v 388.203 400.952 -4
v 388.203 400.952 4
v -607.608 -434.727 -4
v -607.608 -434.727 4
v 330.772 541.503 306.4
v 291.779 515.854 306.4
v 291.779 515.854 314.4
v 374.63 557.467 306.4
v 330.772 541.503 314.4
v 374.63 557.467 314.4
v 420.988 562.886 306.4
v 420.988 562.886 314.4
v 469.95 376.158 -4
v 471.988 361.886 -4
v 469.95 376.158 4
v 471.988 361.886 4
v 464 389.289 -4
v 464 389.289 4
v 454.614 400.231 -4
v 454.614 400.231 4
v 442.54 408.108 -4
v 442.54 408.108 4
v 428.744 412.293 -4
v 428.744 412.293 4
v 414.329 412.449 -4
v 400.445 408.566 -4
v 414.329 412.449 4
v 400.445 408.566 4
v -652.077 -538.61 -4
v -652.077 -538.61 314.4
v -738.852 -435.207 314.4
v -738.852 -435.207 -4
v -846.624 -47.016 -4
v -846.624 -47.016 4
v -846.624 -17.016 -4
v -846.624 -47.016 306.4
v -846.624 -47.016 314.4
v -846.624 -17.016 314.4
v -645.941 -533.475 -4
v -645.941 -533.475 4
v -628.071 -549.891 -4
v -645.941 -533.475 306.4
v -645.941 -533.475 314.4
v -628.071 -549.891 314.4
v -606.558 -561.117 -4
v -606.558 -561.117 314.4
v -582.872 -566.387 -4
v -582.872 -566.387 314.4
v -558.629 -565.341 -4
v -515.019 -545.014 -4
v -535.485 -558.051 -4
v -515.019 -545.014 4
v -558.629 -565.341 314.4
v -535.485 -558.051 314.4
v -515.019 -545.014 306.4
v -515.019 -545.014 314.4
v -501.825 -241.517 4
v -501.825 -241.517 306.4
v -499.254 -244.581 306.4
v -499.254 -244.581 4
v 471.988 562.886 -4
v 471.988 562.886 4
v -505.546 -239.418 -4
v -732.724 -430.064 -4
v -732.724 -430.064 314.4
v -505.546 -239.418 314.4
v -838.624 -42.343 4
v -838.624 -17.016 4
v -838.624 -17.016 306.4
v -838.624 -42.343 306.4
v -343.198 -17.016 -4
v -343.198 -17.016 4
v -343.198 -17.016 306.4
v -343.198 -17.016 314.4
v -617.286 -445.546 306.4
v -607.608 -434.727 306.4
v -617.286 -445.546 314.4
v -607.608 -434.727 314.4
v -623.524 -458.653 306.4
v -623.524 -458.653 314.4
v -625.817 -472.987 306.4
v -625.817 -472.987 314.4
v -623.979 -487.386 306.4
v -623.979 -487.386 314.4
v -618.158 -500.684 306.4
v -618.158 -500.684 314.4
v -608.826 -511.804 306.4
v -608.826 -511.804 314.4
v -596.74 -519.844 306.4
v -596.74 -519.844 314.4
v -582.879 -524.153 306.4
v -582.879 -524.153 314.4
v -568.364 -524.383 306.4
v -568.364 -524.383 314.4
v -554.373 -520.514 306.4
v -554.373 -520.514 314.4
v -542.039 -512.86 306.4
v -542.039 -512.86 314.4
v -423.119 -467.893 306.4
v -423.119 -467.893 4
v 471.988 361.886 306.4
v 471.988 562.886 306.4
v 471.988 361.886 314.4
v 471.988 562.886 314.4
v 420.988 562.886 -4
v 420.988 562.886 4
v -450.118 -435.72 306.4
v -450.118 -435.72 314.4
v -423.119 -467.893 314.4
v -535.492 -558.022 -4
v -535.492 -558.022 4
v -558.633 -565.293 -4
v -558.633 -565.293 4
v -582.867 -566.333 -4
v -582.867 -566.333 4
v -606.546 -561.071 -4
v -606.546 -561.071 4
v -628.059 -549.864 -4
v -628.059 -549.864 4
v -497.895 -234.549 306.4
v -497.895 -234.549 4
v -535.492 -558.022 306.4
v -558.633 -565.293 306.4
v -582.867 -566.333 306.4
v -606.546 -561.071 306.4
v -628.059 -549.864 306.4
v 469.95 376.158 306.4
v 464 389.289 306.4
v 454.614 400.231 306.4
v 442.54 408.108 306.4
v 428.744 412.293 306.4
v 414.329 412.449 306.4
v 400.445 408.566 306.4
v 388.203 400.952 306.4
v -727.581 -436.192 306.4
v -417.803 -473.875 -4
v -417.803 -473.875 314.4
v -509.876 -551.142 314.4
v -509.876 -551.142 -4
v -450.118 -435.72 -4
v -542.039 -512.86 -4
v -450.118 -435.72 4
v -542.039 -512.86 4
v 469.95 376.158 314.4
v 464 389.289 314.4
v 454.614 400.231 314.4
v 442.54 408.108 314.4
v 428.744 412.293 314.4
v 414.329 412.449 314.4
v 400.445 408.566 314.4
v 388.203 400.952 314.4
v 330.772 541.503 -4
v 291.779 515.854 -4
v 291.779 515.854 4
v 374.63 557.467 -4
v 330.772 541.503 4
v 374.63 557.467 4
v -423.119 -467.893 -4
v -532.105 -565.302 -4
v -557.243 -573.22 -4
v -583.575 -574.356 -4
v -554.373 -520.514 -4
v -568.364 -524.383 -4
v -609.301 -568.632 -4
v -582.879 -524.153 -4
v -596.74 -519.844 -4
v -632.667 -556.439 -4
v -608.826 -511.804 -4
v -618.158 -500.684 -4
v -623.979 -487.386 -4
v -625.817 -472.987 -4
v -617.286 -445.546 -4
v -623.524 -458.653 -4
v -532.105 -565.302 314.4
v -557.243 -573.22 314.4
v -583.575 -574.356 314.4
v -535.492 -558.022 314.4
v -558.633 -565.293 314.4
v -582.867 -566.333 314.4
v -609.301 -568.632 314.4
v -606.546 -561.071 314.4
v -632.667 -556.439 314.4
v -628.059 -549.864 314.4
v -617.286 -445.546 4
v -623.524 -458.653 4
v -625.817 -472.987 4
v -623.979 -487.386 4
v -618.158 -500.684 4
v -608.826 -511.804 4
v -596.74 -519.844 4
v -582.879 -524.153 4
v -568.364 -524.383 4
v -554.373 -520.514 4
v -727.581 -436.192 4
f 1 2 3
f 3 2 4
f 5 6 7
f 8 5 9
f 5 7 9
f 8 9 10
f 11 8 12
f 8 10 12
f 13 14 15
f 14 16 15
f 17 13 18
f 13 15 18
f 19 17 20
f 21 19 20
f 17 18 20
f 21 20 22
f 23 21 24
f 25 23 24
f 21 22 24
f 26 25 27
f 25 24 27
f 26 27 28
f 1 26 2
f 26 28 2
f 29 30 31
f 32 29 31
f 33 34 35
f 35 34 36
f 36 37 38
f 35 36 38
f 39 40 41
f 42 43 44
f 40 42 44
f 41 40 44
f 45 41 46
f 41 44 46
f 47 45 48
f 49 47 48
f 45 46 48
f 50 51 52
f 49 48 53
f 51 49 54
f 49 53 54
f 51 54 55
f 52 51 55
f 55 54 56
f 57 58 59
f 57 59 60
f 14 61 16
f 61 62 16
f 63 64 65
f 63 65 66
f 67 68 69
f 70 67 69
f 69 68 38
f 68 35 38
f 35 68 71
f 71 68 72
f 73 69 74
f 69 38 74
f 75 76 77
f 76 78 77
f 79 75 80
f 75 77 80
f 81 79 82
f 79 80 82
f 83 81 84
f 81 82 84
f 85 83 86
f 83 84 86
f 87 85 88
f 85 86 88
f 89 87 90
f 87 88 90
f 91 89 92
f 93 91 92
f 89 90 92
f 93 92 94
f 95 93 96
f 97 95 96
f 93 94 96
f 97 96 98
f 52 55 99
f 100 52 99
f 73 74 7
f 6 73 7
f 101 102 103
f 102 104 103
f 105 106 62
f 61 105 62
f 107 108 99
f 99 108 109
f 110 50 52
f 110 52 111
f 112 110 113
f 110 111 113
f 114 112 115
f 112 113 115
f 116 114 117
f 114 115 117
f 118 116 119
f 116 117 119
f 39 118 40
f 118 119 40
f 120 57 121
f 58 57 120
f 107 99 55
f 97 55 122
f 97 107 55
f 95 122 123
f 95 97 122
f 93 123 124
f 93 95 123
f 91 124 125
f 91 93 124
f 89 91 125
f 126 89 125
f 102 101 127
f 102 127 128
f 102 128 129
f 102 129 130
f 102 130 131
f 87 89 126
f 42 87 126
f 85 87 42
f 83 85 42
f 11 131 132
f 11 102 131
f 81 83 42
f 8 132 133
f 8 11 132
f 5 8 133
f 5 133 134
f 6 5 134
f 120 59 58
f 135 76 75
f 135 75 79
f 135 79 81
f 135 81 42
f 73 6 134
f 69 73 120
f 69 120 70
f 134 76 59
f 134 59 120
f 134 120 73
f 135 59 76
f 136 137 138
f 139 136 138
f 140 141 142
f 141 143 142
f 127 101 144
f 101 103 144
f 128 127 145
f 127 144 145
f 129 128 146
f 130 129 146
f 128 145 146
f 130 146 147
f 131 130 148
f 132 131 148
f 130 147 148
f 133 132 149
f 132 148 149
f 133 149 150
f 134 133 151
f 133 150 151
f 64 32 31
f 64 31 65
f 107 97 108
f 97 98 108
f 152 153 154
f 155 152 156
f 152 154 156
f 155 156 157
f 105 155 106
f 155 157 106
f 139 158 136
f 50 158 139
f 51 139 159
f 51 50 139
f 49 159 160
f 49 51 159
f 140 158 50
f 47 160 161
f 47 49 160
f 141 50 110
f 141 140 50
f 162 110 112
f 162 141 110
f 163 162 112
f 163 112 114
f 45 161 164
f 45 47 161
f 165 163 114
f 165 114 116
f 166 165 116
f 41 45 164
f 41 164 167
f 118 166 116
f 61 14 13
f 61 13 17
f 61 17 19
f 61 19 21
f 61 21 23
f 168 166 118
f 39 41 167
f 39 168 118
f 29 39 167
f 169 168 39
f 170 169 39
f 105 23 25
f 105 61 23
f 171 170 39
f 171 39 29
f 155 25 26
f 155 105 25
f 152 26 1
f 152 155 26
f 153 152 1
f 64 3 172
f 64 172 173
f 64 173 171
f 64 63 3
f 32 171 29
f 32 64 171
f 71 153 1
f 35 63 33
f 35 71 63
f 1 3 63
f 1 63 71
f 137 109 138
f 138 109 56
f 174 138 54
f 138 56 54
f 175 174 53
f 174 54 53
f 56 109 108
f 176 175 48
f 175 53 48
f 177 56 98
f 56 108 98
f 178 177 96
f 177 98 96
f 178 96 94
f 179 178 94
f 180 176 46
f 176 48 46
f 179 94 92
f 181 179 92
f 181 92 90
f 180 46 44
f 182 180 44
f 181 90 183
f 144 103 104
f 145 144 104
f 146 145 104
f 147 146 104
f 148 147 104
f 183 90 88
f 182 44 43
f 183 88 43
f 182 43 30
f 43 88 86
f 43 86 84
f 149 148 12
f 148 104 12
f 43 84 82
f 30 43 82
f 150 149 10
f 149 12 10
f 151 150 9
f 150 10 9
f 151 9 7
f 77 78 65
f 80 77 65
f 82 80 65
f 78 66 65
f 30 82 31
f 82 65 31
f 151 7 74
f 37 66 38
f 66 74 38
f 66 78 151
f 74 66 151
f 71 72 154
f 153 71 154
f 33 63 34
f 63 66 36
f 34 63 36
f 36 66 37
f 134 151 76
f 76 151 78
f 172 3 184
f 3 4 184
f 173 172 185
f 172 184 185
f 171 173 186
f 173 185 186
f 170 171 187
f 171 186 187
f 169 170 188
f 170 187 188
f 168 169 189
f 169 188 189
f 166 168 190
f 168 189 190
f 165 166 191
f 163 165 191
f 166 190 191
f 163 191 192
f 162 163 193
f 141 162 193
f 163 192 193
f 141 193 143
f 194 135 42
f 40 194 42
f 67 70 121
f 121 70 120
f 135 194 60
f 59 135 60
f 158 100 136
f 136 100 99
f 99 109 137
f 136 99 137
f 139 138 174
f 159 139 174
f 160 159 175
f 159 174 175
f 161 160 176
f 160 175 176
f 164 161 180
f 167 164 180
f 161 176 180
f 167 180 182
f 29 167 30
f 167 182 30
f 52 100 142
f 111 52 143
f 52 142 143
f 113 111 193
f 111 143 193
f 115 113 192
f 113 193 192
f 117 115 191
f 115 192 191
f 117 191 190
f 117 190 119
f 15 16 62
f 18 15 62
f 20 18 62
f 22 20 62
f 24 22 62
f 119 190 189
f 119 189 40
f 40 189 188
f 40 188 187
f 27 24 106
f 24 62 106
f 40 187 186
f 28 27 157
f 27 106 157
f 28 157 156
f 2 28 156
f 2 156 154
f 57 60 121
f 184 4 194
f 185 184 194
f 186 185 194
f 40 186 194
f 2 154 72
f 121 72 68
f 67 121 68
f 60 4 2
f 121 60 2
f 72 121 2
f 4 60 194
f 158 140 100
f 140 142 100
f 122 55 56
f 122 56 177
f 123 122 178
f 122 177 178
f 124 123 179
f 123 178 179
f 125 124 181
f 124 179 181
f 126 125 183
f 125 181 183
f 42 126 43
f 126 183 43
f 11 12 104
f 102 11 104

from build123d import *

# Parameters (mm, degrees)
EXTRUDE_1_DEPTH        = 4
PATTERN_LINEAR_1_COUNT = 2
PATTERN_LINEAR_1_PITCH = 310.4
SKETCH_7_W             = 395.874868567
SKETCH_7_H             = 318.4
EXTRUDE_2_DEPTH        = 8
SKETCH_8_W             = 318.4
SKETCH_8_H             = 30
EXTRUDE_3_DEPTH        = 8
SKETCH_9_W             = 298.07386306
SKETCH_9_H             = 318.4
EXTRUDE_4_DEPTH        = 4
EXTRUDE_5_DEPTH        = 318.4


with BuildPart() as part:
    # 草图4 → 凸台-拉伸1 (new, symmetric)
    with BuildSketch(Plane.XY):
        with BuildLine():
            Line((420.987802859, 562.886051953), (471.987802859, 562.886051953))
            Line((471.987802859, 562.886051953), (471.987802859, 361.886051953))
            ThreePointArc((471.987802859, 361.886051953), (442.540044204, 408.108350608), (388.203454114, 400.952488665))
            Line((388.203454114, 400.952488665), (-607.607677768, -434.726989137))
            ThreePointArc((-607.607677768, -434.726989137), (-613.889765736, -506.577774594), (-542.038980279, -512.859862561))
            Line((-542.038980279, -512.859862561), (-450.117952721, -435.720218456))
            Line((-450.117952721, -435.720218456), (-423.119077284, -467.892578102))
            Line((-423.119077284, -467.892578102), (-515.018746035, -545.014298008))
            ThreePointArc((-515.018746035, -545.014298008), (-582.867486655, -566.333113479), (-645.94139002, -533.475447539))
            Line((-645.94139002, -533.475447539), (-730.152226268, -433.128256555))
            Line((-730.152226268, -433.128256555), (-659.034107171, -373.446304098))
            Line((-659.034107171, -373.446304098), (-501.825094761, -241.51732561))
            Line((-501.825094761, -241.51732561), (-846.623641588, -47.015722354))
            Line((-846.623641588, -47.015722354), (-846.623641588, -17.015722354))
            Line((-846.623641588, -17.015722354), (-343.198253767, -17.015722354))
            Line((-343.198253767, -17.015722354), (291.778898983, 515.853773113))
            ThreePointArc((291.778898983, 515.853773113), (352.236482701, 550.762350034), (420.987802859, 562.886051953))
        make_face()
    extrude(amount=EXTRUDE_1_DEPTH, both=True)


with BuildPart() as pattern_linear_1_1:
    # 阵列(线性)1: pattern copy
    add(part.part.moved(Location(Vector(0, 0, 1) * (1 * PATTERN_LINEAR_1_PITCH))))


with BuildPart() as part_1:
    add(part.part)

    add(pattern_linear_1_1.part)  # 凸台-拉伸2 merges 阵列(线性)1_1
    # 草图7 → 凸台-拉伸2 (add)
    with BuildSketch(Plane(origin=(-224.491205057, -397.961970406, 0), x_dir=(0.870978620276557, -0.4913209165312884, 0), z_dir=(-0.4913209165312884, -0.870978620276557, 0))):
        with Locations((-516.353849163, 155.2)):
            Rectangle(SKETCH_7_W, SKETCH_7_H)
    extrude(amount=-EXTRUDE_2_DEPTH)

    # 草图8 → 凸台-拉伸3 (add)
    with BuildSketch(Plane.ZY.offset(846.623641588)):
        with Locations((155.2, -32.015722354)):
            Rectangle(SKETCH_8_W, SKETCH_8_H)
    extrude(amount=-EXTRUDE_3_DEPTH)

    # 草图9 → 凸台-拉伸4 (add, symmetric)
    with BuildSketch(Plane(origin=(-88.443218659, 105.390576195, 0), x_dir=(0.7660085629862927, 0.6428303675400493, 0), z_dir=(-0.6428303675400493, 0.7660085629862927, 0))):
        with Locations((-688.693922428, -155.2)):
            Rectangle(SKETCH_9_W, SKETCH_9_H)
    extrude(amount=EXTRUDE_4_DEPTH, both=True)

    # 草图10 → 凸台-拉伸5 (add)
    with BuildSketch(Plane.XY.offset(314.4)):
        with BuildLine():
            Line((-732.723547738, -430.064222303), (-645.94139002, -533.475447539))
            ThreePointArc((-645.94139002, -533.475447539), (-582.872198439, -566.386574546), (-515.018746035, -545.014298008))
            Line((-515.018746035, -545.014298008), (-423.119077284, -467.892578102))
            Line((-423.119077284, -467.892578102), (-417.802582401, -473.874750967))
            Line((-417.802582401, -473.874750967), (-509.876103095, -551.142366512))
            ThreePointArc((-509.876103095, -551.142366512), (-583.574554826, -574.355683374), (-652.076622248, -538.609541958))
            Line((-652.076622248, -538.609541958), (-738.851610287, -435.206860245))
            Line((-738.851610287, -435.206860245), (-732.723547738, -430.064222303))
        make_face()
    extrude(amount=-EXTRUDE_5_DEPTH)


solid = part_1.part
